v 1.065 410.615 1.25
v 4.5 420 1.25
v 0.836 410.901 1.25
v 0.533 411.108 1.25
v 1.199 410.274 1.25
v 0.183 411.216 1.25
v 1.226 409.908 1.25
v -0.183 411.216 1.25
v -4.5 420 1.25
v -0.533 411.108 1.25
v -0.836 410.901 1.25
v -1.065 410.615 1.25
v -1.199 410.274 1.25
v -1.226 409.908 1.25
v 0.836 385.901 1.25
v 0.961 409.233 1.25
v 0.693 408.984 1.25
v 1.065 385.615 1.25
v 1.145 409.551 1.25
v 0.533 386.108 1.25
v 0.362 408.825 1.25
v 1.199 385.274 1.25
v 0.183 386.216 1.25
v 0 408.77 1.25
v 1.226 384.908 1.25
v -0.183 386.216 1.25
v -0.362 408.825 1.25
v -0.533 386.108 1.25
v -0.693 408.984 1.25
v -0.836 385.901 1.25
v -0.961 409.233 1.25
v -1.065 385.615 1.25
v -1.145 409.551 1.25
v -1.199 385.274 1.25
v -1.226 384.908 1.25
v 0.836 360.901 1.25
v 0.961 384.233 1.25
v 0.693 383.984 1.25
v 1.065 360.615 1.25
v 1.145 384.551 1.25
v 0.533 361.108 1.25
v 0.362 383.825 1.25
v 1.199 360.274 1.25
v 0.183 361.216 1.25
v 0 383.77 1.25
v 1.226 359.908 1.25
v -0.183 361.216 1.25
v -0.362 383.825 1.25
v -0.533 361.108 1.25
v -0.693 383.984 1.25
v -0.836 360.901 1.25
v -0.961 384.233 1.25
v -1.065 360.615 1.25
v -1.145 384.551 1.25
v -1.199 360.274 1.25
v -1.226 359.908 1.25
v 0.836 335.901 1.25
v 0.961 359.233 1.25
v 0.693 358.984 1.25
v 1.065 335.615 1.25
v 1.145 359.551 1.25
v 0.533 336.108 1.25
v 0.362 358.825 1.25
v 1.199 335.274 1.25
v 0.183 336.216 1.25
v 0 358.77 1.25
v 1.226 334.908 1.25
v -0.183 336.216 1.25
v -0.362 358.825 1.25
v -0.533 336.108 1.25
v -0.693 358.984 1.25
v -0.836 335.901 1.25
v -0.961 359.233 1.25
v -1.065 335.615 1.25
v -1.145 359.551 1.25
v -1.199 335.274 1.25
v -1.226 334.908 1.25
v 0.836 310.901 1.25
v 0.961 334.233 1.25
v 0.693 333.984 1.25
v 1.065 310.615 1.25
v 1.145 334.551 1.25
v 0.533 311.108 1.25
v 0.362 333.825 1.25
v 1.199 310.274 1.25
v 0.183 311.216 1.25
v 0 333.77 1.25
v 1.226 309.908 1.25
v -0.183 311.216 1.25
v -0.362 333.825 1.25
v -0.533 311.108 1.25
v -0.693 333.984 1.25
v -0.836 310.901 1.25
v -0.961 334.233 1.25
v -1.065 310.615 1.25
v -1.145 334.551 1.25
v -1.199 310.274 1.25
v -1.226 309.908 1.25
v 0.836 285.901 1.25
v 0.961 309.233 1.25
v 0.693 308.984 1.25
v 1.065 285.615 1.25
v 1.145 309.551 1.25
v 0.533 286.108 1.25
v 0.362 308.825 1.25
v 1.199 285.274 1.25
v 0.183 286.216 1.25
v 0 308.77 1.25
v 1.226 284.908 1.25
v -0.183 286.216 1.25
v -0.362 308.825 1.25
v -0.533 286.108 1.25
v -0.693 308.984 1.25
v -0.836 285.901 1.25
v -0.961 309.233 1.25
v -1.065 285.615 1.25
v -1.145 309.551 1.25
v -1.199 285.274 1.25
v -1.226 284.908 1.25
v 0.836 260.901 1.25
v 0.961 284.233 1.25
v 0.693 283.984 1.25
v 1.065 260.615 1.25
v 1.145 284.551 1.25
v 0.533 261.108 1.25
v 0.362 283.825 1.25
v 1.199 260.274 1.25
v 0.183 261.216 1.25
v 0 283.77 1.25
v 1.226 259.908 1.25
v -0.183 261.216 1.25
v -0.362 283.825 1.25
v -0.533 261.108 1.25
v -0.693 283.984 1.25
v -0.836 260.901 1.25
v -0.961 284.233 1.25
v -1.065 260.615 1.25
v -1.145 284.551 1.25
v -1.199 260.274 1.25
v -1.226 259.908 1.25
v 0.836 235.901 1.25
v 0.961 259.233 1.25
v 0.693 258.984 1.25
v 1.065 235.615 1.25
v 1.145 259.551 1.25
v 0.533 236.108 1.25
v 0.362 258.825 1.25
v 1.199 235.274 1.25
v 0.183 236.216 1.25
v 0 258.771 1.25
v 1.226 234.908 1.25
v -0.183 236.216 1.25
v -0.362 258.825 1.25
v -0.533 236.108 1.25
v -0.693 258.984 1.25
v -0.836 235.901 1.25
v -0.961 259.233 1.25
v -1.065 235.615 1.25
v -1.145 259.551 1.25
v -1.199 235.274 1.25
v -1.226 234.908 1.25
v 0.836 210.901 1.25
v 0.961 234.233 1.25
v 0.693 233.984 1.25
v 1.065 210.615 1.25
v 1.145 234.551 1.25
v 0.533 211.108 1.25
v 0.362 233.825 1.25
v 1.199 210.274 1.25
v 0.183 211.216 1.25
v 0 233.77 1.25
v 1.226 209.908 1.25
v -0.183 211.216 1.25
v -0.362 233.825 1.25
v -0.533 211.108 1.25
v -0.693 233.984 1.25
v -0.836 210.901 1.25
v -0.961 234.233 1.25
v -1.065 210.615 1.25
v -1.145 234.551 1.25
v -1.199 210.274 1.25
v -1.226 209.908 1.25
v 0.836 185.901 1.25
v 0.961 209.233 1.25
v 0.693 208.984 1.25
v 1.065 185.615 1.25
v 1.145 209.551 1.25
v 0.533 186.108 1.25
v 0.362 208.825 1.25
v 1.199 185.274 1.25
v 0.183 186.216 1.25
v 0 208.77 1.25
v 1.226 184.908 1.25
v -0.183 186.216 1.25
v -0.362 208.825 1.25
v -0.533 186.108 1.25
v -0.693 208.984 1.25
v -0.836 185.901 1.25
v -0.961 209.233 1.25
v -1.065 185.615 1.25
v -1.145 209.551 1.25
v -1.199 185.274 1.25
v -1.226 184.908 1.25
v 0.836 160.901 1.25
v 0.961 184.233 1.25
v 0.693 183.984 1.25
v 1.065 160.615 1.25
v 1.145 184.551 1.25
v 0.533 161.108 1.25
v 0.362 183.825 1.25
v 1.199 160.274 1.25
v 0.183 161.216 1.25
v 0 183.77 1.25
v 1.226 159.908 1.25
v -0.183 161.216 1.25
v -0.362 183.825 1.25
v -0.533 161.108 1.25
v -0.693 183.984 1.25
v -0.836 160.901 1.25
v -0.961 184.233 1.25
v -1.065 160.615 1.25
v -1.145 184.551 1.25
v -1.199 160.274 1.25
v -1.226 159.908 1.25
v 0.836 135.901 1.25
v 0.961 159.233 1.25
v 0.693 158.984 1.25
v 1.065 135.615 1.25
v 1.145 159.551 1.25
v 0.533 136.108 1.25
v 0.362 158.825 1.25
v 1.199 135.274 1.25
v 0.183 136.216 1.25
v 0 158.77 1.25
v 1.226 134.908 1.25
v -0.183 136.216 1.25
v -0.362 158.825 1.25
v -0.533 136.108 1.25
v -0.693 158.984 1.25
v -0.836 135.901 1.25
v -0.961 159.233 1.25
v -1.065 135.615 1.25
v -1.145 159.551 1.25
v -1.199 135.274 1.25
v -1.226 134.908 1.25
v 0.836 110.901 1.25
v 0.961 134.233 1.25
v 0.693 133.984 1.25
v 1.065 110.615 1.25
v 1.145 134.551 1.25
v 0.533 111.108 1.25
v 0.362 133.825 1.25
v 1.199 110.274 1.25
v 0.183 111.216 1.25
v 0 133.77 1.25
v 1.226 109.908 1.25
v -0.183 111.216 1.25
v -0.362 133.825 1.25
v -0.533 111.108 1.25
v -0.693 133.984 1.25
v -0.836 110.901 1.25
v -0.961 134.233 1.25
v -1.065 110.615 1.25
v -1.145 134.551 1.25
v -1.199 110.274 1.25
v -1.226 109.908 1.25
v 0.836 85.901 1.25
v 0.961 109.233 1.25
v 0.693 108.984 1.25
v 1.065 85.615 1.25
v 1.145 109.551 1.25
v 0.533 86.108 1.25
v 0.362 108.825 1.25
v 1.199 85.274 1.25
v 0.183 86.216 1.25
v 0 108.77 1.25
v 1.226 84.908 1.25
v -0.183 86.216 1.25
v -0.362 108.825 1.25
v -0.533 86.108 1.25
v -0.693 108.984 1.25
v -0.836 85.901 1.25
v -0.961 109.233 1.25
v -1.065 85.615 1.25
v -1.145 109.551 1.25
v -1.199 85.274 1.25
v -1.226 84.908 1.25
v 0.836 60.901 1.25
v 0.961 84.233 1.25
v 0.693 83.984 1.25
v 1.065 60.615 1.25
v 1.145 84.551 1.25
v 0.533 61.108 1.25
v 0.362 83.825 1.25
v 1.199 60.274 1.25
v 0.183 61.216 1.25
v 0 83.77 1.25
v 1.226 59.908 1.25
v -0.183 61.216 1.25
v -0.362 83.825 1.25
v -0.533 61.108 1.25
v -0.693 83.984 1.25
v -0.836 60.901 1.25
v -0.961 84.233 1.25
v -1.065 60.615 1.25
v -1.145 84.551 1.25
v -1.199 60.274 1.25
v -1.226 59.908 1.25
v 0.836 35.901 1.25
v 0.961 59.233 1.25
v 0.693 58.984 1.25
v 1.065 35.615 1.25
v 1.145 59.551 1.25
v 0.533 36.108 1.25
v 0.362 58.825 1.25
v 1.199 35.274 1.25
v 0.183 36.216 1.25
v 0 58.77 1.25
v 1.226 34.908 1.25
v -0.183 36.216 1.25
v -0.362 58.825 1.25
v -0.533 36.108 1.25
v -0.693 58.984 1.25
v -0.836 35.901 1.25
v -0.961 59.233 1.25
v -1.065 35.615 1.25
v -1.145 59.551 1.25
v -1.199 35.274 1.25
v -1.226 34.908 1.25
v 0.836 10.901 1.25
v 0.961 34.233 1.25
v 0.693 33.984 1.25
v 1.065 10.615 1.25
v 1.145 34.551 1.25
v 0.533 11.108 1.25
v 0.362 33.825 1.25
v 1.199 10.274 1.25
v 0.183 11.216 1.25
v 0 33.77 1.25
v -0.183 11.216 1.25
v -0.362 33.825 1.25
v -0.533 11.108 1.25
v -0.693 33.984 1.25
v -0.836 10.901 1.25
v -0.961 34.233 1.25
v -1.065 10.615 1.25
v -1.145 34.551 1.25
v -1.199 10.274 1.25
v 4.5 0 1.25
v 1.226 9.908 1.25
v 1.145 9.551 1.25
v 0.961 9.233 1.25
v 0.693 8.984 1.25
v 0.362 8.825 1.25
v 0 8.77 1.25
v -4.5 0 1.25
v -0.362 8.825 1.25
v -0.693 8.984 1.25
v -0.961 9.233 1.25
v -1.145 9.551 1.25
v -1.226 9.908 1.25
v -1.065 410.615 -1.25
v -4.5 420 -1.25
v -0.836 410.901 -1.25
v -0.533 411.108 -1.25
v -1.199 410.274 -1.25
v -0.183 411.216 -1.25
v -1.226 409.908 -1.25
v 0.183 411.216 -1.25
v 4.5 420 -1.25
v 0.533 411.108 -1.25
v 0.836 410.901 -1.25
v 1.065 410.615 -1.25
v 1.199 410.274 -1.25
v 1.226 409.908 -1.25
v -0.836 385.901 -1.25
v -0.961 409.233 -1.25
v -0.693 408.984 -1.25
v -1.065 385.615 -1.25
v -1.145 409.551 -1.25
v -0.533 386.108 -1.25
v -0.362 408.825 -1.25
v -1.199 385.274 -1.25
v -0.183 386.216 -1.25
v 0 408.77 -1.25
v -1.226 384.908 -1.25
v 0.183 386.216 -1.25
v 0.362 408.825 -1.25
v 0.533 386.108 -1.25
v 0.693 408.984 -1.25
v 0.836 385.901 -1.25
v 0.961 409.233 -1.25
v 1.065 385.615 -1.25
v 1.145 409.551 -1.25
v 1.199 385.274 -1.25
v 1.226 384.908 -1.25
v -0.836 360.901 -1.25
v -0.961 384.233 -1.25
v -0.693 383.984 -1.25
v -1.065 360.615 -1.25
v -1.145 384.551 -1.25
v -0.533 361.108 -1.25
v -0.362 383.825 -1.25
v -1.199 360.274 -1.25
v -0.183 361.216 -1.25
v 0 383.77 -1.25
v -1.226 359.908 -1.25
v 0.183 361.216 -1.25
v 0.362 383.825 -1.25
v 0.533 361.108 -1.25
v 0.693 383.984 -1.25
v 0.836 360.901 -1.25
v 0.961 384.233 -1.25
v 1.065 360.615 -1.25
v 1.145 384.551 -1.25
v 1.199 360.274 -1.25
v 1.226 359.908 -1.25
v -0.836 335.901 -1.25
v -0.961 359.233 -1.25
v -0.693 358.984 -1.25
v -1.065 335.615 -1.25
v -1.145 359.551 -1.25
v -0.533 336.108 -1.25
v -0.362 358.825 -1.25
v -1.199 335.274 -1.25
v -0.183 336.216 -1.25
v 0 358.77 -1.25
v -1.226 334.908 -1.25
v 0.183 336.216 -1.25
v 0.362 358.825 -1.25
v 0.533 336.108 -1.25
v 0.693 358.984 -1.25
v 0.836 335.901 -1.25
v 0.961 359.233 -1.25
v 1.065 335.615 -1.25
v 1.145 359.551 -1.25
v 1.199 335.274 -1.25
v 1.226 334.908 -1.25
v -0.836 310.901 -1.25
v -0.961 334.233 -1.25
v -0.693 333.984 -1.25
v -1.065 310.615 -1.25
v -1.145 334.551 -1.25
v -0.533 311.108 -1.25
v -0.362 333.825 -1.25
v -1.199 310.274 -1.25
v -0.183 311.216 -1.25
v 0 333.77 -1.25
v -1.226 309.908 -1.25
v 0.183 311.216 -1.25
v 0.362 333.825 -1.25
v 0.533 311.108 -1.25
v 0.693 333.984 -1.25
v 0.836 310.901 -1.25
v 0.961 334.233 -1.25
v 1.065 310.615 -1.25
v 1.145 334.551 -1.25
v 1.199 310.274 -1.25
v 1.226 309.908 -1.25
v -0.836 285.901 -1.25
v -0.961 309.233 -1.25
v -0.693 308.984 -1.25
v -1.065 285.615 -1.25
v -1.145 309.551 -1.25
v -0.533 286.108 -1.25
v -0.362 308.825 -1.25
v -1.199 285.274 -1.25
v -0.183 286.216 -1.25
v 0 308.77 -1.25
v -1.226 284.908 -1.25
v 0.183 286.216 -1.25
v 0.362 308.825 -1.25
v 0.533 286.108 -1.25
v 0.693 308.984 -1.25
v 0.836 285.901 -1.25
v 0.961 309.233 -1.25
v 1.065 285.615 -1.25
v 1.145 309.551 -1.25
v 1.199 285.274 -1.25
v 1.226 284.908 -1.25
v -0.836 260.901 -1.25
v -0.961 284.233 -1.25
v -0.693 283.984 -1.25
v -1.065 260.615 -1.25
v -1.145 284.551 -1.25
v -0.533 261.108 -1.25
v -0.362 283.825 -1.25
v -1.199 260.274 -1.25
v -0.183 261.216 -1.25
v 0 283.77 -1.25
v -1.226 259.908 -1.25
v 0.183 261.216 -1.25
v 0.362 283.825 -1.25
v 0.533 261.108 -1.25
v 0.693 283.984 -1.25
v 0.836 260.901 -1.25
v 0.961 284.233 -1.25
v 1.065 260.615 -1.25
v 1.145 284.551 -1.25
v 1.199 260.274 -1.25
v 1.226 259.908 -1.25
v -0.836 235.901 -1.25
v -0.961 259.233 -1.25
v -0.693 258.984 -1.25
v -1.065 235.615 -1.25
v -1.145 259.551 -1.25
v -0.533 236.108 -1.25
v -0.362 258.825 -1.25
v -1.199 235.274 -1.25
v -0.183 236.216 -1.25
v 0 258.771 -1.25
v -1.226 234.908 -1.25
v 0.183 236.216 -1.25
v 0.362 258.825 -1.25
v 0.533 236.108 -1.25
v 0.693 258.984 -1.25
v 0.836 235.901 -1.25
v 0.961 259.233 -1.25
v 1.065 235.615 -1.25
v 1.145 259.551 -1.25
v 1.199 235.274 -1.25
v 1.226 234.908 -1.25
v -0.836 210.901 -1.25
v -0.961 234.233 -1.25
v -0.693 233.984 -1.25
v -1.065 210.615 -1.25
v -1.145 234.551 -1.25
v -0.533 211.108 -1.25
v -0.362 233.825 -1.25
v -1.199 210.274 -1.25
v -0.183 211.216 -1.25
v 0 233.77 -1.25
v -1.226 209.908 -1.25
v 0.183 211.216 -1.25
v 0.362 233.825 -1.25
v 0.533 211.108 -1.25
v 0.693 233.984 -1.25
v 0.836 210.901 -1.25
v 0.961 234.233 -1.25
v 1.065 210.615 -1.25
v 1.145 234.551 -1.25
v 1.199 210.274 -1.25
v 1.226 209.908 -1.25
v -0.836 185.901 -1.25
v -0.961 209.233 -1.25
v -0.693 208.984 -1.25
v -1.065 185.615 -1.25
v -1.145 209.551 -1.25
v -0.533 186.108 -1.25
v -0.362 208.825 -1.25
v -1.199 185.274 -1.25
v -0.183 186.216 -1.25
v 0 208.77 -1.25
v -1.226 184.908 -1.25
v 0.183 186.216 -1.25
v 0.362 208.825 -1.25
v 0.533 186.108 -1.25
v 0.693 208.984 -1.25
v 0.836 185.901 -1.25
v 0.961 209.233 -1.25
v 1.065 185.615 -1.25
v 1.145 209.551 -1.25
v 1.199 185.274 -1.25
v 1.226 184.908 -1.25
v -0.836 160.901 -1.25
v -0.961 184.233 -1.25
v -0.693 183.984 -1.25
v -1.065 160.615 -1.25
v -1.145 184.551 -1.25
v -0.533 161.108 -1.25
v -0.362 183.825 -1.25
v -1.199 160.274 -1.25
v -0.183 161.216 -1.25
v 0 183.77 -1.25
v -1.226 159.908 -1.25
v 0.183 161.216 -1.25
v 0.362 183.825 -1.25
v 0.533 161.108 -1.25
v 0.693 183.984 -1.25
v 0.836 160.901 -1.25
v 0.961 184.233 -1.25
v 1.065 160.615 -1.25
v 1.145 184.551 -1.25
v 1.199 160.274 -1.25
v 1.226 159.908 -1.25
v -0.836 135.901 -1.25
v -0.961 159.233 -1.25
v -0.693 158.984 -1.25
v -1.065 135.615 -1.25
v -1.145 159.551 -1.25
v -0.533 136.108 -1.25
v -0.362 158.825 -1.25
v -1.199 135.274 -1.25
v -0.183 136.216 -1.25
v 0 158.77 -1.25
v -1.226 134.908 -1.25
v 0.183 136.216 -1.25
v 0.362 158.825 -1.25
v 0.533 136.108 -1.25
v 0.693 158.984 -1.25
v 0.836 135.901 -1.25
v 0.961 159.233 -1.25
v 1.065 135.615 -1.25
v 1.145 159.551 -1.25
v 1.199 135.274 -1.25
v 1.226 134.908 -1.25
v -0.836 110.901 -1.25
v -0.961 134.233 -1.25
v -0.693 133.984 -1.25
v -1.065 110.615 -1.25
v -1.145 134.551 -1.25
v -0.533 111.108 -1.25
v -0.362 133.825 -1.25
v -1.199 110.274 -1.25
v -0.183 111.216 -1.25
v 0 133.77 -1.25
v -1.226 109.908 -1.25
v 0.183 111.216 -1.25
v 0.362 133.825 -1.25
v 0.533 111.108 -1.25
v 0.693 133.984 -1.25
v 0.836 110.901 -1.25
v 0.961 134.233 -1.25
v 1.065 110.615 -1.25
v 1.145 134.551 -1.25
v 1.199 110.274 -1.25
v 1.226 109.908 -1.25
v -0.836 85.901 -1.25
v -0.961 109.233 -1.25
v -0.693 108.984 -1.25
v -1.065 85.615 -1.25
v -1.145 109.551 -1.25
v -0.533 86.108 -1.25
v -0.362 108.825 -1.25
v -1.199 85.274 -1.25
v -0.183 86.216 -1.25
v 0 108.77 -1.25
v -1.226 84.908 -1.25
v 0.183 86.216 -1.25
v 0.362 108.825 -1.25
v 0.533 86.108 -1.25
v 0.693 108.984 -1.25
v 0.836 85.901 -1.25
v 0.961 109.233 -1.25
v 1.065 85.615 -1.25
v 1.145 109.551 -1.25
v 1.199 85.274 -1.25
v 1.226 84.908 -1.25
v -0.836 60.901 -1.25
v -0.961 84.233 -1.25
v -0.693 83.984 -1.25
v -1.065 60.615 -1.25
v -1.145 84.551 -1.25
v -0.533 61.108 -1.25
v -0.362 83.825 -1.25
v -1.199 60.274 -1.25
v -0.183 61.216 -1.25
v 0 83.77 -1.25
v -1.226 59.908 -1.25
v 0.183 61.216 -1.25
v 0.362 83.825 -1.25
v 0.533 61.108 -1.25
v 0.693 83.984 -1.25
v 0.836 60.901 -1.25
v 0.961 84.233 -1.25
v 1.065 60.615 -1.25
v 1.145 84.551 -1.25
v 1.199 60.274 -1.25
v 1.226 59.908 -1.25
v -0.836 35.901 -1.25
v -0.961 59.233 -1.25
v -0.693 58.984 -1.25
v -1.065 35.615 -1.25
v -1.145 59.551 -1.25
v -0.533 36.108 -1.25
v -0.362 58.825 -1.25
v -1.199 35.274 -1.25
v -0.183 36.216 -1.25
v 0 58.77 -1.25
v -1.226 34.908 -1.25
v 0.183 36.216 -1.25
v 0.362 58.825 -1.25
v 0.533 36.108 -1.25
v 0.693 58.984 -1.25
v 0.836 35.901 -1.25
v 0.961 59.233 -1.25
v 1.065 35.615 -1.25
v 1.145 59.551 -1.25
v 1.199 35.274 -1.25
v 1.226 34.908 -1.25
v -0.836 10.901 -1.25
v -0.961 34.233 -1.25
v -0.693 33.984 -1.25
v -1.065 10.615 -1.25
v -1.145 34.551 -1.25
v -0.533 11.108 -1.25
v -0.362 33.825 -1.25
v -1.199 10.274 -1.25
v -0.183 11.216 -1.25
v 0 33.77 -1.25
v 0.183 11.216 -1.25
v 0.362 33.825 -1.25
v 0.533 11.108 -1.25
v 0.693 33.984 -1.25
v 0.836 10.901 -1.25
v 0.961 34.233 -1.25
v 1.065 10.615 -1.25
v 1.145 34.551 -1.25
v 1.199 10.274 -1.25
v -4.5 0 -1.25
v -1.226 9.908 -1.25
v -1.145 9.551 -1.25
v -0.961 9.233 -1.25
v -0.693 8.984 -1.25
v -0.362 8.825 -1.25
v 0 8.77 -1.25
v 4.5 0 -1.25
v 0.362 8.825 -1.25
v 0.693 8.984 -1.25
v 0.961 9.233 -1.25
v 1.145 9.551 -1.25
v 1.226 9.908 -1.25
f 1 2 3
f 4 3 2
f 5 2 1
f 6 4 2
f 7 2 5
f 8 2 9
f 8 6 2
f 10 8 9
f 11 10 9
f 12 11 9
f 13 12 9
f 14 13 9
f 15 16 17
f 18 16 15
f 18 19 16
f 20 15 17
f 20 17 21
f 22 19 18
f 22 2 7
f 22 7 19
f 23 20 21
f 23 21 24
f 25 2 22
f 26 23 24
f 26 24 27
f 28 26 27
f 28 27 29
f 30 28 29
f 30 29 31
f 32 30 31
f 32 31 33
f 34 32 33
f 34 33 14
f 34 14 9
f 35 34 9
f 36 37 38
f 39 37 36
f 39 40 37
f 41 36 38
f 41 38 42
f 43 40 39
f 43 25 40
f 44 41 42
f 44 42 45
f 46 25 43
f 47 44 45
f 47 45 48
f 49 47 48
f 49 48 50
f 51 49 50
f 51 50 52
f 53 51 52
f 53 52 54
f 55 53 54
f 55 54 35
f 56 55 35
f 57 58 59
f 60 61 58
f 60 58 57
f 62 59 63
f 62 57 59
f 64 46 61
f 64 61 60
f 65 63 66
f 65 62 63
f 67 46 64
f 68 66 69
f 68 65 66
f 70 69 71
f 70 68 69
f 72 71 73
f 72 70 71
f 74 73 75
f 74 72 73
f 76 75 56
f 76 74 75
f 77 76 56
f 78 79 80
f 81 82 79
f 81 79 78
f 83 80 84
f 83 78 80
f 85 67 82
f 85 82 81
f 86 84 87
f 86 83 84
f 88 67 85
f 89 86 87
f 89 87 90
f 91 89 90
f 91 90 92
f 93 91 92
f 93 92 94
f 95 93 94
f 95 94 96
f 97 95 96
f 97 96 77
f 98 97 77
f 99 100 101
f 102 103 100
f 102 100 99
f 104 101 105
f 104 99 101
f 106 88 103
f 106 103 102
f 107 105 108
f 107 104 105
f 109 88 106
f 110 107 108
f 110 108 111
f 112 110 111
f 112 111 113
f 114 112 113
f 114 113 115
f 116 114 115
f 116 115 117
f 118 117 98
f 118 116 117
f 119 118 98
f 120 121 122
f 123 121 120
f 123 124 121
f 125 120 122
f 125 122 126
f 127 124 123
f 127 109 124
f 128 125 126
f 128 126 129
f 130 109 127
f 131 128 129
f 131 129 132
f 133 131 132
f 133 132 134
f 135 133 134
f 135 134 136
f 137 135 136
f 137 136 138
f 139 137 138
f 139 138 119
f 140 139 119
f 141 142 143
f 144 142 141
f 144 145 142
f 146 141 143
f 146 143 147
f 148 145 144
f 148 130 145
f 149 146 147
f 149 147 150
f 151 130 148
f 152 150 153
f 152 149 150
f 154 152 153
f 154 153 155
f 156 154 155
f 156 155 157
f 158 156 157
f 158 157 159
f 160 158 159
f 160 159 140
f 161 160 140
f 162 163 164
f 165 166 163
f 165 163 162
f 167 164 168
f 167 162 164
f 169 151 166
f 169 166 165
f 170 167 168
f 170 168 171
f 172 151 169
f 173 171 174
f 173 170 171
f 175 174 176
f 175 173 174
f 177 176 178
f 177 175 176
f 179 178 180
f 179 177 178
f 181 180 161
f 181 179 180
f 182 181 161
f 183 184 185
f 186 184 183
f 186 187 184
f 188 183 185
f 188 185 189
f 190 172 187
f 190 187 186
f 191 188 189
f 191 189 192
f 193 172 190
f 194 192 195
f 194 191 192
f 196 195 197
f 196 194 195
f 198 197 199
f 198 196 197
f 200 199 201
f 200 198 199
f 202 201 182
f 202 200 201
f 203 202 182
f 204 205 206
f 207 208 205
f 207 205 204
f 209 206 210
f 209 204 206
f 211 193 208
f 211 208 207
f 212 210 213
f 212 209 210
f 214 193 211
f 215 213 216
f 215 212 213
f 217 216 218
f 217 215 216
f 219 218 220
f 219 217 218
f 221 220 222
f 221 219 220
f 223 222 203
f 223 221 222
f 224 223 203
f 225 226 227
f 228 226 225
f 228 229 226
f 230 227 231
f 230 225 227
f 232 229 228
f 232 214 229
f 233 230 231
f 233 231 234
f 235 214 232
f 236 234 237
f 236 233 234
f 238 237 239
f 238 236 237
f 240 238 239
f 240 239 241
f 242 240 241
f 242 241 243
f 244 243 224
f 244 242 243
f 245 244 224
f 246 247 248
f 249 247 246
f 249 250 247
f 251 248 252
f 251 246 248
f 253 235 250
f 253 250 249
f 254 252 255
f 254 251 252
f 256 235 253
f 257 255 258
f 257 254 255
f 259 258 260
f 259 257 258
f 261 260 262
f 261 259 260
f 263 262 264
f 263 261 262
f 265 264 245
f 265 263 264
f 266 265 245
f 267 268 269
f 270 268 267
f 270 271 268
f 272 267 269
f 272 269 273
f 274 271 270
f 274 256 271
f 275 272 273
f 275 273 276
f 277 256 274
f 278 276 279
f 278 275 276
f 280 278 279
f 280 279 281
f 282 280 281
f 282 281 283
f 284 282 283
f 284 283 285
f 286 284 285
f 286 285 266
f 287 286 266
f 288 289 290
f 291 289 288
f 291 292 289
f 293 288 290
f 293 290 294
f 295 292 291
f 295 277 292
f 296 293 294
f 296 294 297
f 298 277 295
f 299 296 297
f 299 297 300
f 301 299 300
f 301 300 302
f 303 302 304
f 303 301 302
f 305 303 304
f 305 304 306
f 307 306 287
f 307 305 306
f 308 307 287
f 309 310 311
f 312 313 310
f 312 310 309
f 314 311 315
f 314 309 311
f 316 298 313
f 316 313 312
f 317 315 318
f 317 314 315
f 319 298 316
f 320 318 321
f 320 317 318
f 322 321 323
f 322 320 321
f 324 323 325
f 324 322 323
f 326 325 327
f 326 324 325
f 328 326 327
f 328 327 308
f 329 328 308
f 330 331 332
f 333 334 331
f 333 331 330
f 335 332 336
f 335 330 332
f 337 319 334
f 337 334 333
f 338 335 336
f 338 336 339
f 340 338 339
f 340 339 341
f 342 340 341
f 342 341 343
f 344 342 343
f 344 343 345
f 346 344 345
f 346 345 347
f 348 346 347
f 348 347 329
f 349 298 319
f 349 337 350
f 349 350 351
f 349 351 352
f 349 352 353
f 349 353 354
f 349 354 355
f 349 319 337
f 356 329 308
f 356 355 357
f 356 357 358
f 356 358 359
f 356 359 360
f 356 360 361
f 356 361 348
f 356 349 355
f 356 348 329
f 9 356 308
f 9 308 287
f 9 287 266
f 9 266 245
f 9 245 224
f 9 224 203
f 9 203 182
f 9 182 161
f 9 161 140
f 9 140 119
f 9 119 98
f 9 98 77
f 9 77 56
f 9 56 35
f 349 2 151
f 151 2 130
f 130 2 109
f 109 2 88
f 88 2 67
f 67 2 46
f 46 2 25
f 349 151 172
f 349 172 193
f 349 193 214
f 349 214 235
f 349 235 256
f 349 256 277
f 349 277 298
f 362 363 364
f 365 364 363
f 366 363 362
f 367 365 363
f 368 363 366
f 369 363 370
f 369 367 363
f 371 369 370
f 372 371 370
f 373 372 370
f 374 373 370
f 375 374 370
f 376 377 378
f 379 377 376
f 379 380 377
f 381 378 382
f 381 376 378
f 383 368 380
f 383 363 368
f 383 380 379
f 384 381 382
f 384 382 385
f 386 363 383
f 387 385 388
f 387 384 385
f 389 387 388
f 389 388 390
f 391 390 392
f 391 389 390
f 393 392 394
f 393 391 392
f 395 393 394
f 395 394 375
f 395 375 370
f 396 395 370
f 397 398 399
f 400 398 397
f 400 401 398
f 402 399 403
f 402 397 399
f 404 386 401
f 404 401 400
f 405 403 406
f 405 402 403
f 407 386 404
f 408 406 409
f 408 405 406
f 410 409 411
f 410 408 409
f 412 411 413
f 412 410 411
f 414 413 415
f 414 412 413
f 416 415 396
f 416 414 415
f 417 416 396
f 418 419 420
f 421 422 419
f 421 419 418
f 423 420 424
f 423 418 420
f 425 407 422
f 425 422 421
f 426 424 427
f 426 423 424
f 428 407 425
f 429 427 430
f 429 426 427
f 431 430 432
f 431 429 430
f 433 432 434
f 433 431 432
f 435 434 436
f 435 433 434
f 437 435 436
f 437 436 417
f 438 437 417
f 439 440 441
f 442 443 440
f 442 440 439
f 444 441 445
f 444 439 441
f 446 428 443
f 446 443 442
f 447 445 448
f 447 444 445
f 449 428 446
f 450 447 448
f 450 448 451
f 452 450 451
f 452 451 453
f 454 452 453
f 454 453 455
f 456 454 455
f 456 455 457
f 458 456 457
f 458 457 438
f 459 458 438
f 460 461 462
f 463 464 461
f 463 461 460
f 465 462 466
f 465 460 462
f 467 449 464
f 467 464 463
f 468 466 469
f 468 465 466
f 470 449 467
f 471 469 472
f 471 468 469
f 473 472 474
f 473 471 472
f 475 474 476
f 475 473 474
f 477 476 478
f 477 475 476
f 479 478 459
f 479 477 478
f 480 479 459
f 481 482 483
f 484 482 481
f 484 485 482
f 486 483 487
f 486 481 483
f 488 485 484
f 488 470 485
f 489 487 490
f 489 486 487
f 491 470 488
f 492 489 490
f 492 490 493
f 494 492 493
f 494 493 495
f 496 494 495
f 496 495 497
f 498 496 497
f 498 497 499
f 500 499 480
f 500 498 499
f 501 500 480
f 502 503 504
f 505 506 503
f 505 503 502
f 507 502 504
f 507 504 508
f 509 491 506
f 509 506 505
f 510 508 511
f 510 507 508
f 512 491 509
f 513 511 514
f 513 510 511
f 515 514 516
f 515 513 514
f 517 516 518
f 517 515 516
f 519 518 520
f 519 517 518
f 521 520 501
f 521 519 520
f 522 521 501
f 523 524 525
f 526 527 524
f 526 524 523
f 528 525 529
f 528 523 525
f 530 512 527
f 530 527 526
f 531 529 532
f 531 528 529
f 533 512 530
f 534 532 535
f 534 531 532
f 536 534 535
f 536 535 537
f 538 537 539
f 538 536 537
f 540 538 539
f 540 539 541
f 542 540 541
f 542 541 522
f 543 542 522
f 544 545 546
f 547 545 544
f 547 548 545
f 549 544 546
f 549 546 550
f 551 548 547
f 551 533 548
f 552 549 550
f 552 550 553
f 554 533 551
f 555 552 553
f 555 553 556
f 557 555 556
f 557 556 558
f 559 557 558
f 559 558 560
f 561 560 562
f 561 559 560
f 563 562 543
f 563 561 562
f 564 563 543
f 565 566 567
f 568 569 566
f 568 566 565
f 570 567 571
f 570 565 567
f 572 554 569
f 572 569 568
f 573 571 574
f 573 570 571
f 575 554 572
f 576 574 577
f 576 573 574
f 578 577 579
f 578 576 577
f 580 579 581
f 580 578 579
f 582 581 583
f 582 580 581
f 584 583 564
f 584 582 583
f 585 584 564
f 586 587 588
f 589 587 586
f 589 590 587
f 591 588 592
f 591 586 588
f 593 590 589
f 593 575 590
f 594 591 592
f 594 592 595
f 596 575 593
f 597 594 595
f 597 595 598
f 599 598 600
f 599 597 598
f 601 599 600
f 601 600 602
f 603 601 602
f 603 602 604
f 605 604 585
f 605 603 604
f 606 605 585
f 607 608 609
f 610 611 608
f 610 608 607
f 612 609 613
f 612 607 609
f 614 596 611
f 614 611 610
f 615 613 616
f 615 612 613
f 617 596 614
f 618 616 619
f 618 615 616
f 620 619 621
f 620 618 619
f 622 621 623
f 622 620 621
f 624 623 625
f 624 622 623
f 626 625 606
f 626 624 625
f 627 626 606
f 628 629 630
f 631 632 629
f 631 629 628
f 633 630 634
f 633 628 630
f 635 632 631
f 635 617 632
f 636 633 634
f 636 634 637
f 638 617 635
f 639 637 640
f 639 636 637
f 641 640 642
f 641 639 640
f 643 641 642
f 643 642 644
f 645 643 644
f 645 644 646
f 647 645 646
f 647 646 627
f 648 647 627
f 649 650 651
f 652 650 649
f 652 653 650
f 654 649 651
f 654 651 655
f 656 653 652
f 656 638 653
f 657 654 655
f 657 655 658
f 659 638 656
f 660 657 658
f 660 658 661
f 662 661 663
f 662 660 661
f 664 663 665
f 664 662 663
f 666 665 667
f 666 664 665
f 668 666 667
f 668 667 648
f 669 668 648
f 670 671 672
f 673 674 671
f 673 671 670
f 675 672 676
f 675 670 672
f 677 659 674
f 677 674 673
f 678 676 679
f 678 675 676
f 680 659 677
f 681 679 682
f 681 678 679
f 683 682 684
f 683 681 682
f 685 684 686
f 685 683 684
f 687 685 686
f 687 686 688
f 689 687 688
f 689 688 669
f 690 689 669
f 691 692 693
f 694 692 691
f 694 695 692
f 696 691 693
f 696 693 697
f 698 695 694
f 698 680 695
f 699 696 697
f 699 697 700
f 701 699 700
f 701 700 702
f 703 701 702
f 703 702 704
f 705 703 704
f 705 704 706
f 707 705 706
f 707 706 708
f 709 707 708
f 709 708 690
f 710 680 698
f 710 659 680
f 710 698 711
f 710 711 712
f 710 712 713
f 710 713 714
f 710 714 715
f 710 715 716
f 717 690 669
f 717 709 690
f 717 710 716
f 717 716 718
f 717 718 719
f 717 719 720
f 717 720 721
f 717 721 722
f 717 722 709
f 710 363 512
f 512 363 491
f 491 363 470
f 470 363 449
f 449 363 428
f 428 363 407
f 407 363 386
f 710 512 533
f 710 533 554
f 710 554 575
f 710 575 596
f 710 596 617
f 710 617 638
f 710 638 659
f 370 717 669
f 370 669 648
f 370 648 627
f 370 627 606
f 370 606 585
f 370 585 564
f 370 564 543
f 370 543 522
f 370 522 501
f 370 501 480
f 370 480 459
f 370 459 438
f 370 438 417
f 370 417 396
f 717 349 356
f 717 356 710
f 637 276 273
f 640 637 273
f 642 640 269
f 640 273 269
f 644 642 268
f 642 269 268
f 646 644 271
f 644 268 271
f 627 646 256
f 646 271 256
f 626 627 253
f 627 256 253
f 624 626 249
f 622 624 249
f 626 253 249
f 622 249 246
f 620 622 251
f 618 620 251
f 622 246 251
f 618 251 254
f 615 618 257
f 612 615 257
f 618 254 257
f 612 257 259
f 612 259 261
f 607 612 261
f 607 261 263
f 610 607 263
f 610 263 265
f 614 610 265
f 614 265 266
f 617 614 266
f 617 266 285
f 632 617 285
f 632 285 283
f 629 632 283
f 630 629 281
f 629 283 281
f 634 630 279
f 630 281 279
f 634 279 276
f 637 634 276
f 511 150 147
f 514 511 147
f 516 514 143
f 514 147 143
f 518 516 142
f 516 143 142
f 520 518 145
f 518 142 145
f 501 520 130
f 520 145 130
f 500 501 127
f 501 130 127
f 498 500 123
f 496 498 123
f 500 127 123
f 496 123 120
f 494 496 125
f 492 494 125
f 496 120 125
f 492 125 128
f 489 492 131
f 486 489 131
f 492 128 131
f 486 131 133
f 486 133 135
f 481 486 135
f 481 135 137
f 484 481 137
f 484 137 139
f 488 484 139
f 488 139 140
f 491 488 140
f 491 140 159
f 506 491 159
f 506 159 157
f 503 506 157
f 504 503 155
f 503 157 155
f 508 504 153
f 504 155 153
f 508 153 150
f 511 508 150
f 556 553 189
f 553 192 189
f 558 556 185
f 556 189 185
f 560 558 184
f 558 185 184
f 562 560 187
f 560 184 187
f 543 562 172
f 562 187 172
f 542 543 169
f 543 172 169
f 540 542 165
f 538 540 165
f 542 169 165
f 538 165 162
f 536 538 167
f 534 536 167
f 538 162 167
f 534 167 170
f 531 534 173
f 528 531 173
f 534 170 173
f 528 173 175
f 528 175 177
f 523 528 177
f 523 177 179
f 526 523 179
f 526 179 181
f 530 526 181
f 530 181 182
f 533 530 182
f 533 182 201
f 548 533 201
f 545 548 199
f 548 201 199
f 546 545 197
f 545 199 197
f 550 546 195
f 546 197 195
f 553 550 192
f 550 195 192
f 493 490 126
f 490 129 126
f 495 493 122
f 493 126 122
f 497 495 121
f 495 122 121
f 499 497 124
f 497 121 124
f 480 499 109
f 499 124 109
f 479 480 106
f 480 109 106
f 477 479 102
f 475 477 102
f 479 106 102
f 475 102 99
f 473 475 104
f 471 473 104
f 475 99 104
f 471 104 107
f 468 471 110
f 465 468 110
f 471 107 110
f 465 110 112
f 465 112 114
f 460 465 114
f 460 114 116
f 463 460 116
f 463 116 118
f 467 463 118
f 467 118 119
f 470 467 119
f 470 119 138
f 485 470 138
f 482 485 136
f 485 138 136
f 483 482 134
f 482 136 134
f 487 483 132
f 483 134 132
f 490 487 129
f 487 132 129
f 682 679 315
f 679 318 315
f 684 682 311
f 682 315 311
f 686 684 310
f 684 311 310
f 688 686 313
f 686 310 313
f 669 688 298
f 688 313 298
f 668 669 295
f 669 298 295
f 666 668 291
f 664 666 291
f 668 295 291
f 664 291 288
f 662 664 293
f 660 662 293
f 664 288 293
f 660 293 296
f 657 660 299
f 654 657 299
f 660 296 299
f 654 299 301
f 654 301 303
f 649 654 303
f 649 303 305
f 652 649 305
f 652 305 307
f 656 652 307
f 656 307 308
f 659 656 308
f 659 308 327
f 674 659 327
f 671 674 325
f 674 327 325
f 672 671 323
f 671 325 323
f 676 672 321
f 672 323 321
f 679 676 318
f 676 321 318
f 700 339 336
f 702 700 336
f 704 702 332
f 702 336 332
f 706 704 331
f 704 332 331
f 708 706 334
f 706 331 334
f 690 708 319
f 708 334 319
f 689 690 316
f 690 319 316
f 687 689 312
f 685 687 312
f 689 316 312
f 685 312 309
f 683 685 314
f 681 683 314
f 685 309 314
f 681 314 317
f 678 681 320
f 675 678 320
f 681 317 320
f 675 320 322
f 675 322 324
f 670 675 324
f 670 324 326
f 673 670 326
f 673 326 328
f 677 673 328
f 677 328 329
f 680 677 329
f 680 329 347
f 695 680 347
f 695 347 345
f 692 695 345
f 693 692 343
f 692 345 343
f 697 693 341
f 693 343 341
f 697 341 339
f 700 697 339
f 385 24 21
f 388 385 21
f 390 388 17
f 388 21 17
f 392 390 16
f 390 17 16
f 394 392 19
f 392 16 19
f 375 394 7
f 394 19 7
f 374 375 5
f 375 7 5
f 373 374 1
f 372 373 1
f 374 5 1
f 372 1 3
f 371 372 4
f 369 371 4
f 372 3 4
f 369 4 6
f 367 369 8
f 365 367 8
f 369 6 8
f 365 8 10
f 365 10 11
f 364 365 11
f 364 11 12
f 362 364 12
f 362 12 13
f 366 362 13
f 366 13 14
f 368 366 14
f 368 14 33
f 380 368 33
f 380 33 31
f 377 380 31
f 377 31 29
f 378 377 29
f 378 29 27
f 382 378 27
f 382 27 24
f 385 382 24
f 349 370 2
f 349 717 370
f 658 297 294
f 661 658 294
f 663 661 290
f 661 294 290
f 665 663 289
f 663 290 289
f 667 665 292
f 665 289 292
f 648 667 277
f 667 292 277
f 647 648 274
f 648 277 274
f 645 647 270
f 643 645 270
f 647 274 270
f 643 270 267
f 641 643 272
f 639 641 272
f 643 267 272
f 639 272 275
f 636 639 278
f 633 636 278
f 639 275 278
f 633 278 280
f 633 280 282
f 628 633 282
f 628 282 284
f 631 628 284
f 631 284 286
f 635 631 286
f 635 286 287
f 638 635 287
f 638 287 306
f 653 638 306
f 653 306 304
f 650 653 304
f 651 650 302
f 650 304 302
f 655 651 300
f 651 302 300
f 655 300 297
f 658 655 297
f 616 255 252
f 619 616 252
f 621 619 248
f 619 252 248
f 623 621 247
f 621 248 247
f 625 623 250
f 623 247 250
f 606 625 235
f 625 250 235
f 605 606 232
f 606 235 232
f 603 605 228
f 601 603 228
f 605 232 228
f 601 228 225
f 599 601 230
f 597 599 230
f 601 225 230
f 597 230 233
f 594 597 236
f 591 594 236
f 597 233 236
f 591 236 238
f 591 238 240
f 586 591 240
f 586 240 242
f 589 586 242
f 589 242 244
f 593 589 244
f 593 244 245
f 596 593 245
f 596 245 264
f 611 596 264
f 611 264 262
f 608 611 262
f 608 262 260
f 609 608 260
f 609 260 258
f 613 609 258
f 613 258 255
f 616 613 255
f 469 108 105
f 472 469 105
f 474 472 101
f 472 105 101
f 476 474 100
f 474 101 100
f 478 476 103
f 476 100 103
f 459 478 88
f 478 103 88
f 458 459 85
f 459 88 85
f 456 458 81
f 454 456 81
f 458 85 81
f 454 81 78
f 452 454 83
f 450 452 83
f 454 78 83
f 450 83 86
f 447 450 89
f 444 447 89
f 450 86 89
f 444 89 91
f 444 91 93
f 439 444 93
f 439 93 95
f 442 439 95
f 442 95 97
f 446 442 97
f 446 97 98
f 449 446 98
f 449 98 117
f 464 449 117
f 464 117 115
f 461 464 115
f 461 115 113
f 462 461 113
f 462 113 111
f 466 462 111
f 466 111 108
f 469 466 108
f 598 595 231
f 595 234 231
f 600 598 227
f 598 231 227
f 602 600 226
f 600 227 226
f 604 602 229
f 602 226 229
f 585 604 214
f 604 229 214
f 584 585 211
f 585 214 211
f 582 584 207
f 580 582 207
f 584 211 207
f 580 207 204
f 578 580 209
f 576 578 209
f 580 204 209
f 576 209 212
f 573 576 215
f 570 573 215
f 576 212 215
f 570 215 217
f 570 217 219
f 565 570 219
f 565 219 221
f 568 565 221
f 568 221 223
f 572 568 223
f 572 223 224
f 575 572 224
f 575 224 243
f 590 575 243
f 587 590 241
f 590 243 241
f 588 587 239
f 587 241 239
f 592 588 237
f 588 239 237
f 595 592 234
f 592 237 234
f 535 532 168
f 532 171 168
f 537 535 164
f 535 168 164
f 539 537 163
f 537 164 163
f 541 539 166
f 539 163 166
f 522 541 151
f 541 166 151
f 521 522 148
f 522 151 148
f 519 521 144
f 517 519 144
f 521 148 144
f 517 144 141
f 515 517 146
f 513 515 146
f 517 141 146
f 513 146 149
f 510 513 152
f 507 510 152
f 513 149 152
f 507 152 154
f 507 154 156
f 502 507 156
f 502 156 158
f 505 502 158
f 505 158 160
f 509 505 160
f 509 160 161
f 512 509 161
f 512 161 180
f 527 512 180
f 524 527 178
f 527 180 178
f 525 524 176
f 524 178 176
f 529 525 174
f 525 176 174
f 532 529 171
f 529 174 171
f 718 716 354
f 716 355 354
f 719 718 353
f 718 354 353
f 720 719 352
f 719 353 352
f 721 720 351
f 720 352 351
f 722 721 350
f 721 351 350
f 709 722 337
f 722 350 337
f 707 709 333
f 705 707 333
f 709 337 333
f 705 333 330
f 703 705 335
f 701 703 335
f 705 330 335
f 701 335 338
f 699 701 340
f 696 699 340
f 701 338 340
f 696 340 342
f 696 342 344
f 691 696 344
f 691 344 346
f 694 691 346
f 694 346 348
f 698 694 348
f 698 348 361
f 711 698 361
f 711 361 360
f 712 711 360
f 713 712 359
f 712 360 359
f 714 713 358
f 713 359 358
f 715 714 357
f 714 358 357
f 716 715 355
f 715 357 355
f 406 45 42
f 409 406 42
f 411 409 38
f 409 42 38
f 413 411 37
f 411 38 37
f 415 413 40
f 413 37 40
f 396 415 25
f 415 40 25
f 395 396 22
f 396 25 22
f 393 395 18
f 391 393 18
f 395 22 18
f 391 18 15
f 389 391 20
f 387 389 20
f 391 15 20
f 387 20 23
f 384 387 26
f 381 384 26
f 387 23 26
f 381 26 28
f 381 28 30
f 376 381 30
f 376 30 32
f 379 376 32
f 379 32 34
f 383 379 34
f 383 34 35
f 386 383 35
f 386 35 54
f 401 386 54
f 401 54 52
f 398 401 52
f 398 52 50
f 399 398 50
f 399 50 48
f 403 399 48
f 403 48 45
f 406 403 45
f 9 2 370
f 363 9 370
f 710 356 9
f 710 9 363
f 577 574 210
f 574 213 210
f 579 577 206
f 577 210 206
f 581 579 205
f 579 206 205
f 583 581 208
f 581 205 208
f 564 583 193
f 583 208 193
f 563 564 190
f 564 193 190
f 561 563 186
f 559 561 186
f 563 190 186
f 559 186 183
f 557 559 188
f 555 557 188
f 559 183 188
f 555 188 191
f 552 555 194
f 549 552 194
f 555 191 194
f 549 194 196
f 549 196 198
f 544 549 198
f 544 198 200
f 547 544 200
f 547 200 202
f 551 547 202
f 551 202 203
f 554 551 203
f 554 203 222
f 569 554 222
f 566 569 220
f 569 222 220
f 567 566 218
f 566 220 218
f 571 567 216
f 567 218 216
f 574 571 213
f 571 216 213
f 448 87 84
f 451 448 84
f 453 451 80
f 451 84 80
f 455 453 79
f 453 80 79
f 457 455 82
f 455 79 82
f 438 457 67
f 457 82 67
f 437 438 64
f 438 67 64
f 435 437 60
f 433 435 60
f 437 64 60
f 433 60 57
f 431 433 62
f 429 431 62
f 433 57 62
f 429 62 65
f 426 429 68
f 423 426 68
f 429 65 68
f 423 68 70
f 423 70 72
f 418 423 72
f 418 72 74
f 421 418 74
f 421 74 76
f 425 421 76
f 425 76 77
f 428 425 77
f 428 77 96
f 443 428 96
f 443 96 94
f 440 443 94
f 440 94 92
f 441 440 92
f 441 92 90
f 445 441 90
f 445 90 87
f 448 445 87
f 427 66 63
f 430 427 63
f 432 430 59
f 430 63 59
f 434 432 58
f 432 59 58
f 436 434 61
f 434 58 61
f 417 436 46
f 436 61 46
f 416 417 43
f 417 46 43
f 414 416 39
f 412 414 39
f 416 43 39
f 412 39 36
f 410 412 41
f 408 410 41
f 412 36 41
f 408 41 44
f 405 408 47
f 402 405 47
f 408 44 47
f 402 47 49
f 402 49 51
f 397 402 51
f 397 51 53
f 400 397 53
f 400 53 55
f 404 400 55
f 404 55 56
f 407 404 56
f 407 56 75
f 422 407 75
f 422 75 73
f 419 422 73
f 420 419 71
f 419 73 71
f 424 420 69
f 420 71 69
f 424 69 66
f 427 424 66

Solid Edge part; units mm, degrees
sketch "Sketch1" plane through (0, 0, 0) normal (0, -1, 0) x (1, 0, 0)
  line L0 (-4.5, -1.25) -> (4.5, -1.25)
  line L1 (4.5, -1.25) -> (4.5, 1.25)
  line L2 (4.5, 1.25) -> (-4.5, 1.25)
  line L3 (-4.5, 1.25) -> (-4.5, -1.25)
  dimension "D1" = 9
  dimension "D2" = 2.5
extrude "Protrusion1" add sketch "Sketch1" against normal blind 420
hole "Hole_1" at (0, 10, 1.25) direction (0, 0, -1) diameter 2.459 end up to next
pattern_linear "Pattern1" count 17 spacing 25 along (0, 1, 0) of "Hole_1"
properties material "Stainless Steel, 304"
